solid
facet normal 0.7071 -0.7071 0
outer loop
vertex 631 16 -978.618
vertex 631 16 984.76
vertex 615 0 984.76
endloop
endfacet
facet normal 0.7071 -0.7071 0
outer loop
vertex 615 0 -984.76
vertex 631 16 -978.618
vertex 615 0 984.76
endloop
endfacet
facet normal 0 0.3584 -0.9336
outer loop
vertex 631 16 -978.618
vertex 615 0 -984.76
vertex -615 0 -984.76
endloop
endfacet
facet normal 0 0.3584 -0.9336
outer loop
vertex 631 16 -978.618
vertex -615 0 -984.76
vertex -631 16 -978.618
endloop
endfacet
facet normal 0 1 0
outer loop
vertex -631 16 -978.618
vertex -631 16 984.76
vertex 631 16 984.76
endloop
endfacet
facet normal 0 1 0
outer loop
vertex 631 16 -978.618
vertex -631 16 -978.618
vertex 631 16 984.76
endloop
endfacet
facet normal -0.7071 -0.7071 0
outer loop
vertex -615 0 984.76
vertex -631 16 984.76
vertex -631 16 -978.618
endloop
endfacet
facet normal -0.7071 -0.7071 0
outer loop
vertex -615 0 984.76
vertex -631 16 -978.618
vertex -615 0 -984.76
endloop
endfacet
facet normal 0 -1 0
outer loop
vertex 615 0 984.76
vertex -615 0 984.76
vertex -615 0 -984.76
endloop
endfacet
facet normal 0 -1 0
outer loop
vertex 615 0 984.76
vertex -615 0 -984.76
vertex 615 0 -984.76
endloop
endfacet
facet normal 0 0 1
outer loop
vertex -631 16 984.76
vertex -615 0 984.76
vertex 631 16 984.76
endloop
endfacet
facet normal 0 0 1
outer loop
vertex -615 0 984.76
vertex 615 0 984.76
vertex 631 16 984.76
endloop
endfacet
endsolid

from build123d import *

# Parameters (mm, degrees)
SKETCH1_W           = 1262
SKETCH1_H           = 1969.52
BOSS_EXTRUDE1_DEPTH = 16
CUT_EXTRUDE1_DEPTH  = 2069.193905416
CUT_EXTRUDE3_DEPTH  = 1601.828615936


with BuildPart() as part:
    # Sketch1 → Boss-Extrude1 (new body)
    with BuildSketch(Plane(origin=(0, 0, 0), x_dir=(1, 0, 0), z_dir=(0, 1, 0))):
        Rectangle(SKETCH1_W, SKETCH1_H)
    extrude(amount=BOSS_EXTRUDE1_DEPTH)

    # Sketch2 → Cut-Extrude1 (cut, through all)
    with BuildSketch(Plane(origin=(0, 0, -984.76), x_dir=(-1, 0, 0), z_dir=(0, 0, -1))):
        Polygon((-631, 16), (-615, 0), (-631, 0), align=None)
        Polygon((631, 16), (615, 0), (631, 0), align=None)
    extrude(amount=-CUT_EXTRUDE1_DEPTH, mode=Mode.SUBTRACT)

    # Sketch4 → Cut-Extrude3 (cut, through all)
    with BuildSketch(Plane.ZY.offset(631)):
        Polygon((-984.76, 0), (-978.618175439, 16), (-984.76, 16), align=None)
    extrude(amount=-CUT_EXTRUDE3_DEPTH, mode=Mode.SUBTRACT)


solid = part.part
